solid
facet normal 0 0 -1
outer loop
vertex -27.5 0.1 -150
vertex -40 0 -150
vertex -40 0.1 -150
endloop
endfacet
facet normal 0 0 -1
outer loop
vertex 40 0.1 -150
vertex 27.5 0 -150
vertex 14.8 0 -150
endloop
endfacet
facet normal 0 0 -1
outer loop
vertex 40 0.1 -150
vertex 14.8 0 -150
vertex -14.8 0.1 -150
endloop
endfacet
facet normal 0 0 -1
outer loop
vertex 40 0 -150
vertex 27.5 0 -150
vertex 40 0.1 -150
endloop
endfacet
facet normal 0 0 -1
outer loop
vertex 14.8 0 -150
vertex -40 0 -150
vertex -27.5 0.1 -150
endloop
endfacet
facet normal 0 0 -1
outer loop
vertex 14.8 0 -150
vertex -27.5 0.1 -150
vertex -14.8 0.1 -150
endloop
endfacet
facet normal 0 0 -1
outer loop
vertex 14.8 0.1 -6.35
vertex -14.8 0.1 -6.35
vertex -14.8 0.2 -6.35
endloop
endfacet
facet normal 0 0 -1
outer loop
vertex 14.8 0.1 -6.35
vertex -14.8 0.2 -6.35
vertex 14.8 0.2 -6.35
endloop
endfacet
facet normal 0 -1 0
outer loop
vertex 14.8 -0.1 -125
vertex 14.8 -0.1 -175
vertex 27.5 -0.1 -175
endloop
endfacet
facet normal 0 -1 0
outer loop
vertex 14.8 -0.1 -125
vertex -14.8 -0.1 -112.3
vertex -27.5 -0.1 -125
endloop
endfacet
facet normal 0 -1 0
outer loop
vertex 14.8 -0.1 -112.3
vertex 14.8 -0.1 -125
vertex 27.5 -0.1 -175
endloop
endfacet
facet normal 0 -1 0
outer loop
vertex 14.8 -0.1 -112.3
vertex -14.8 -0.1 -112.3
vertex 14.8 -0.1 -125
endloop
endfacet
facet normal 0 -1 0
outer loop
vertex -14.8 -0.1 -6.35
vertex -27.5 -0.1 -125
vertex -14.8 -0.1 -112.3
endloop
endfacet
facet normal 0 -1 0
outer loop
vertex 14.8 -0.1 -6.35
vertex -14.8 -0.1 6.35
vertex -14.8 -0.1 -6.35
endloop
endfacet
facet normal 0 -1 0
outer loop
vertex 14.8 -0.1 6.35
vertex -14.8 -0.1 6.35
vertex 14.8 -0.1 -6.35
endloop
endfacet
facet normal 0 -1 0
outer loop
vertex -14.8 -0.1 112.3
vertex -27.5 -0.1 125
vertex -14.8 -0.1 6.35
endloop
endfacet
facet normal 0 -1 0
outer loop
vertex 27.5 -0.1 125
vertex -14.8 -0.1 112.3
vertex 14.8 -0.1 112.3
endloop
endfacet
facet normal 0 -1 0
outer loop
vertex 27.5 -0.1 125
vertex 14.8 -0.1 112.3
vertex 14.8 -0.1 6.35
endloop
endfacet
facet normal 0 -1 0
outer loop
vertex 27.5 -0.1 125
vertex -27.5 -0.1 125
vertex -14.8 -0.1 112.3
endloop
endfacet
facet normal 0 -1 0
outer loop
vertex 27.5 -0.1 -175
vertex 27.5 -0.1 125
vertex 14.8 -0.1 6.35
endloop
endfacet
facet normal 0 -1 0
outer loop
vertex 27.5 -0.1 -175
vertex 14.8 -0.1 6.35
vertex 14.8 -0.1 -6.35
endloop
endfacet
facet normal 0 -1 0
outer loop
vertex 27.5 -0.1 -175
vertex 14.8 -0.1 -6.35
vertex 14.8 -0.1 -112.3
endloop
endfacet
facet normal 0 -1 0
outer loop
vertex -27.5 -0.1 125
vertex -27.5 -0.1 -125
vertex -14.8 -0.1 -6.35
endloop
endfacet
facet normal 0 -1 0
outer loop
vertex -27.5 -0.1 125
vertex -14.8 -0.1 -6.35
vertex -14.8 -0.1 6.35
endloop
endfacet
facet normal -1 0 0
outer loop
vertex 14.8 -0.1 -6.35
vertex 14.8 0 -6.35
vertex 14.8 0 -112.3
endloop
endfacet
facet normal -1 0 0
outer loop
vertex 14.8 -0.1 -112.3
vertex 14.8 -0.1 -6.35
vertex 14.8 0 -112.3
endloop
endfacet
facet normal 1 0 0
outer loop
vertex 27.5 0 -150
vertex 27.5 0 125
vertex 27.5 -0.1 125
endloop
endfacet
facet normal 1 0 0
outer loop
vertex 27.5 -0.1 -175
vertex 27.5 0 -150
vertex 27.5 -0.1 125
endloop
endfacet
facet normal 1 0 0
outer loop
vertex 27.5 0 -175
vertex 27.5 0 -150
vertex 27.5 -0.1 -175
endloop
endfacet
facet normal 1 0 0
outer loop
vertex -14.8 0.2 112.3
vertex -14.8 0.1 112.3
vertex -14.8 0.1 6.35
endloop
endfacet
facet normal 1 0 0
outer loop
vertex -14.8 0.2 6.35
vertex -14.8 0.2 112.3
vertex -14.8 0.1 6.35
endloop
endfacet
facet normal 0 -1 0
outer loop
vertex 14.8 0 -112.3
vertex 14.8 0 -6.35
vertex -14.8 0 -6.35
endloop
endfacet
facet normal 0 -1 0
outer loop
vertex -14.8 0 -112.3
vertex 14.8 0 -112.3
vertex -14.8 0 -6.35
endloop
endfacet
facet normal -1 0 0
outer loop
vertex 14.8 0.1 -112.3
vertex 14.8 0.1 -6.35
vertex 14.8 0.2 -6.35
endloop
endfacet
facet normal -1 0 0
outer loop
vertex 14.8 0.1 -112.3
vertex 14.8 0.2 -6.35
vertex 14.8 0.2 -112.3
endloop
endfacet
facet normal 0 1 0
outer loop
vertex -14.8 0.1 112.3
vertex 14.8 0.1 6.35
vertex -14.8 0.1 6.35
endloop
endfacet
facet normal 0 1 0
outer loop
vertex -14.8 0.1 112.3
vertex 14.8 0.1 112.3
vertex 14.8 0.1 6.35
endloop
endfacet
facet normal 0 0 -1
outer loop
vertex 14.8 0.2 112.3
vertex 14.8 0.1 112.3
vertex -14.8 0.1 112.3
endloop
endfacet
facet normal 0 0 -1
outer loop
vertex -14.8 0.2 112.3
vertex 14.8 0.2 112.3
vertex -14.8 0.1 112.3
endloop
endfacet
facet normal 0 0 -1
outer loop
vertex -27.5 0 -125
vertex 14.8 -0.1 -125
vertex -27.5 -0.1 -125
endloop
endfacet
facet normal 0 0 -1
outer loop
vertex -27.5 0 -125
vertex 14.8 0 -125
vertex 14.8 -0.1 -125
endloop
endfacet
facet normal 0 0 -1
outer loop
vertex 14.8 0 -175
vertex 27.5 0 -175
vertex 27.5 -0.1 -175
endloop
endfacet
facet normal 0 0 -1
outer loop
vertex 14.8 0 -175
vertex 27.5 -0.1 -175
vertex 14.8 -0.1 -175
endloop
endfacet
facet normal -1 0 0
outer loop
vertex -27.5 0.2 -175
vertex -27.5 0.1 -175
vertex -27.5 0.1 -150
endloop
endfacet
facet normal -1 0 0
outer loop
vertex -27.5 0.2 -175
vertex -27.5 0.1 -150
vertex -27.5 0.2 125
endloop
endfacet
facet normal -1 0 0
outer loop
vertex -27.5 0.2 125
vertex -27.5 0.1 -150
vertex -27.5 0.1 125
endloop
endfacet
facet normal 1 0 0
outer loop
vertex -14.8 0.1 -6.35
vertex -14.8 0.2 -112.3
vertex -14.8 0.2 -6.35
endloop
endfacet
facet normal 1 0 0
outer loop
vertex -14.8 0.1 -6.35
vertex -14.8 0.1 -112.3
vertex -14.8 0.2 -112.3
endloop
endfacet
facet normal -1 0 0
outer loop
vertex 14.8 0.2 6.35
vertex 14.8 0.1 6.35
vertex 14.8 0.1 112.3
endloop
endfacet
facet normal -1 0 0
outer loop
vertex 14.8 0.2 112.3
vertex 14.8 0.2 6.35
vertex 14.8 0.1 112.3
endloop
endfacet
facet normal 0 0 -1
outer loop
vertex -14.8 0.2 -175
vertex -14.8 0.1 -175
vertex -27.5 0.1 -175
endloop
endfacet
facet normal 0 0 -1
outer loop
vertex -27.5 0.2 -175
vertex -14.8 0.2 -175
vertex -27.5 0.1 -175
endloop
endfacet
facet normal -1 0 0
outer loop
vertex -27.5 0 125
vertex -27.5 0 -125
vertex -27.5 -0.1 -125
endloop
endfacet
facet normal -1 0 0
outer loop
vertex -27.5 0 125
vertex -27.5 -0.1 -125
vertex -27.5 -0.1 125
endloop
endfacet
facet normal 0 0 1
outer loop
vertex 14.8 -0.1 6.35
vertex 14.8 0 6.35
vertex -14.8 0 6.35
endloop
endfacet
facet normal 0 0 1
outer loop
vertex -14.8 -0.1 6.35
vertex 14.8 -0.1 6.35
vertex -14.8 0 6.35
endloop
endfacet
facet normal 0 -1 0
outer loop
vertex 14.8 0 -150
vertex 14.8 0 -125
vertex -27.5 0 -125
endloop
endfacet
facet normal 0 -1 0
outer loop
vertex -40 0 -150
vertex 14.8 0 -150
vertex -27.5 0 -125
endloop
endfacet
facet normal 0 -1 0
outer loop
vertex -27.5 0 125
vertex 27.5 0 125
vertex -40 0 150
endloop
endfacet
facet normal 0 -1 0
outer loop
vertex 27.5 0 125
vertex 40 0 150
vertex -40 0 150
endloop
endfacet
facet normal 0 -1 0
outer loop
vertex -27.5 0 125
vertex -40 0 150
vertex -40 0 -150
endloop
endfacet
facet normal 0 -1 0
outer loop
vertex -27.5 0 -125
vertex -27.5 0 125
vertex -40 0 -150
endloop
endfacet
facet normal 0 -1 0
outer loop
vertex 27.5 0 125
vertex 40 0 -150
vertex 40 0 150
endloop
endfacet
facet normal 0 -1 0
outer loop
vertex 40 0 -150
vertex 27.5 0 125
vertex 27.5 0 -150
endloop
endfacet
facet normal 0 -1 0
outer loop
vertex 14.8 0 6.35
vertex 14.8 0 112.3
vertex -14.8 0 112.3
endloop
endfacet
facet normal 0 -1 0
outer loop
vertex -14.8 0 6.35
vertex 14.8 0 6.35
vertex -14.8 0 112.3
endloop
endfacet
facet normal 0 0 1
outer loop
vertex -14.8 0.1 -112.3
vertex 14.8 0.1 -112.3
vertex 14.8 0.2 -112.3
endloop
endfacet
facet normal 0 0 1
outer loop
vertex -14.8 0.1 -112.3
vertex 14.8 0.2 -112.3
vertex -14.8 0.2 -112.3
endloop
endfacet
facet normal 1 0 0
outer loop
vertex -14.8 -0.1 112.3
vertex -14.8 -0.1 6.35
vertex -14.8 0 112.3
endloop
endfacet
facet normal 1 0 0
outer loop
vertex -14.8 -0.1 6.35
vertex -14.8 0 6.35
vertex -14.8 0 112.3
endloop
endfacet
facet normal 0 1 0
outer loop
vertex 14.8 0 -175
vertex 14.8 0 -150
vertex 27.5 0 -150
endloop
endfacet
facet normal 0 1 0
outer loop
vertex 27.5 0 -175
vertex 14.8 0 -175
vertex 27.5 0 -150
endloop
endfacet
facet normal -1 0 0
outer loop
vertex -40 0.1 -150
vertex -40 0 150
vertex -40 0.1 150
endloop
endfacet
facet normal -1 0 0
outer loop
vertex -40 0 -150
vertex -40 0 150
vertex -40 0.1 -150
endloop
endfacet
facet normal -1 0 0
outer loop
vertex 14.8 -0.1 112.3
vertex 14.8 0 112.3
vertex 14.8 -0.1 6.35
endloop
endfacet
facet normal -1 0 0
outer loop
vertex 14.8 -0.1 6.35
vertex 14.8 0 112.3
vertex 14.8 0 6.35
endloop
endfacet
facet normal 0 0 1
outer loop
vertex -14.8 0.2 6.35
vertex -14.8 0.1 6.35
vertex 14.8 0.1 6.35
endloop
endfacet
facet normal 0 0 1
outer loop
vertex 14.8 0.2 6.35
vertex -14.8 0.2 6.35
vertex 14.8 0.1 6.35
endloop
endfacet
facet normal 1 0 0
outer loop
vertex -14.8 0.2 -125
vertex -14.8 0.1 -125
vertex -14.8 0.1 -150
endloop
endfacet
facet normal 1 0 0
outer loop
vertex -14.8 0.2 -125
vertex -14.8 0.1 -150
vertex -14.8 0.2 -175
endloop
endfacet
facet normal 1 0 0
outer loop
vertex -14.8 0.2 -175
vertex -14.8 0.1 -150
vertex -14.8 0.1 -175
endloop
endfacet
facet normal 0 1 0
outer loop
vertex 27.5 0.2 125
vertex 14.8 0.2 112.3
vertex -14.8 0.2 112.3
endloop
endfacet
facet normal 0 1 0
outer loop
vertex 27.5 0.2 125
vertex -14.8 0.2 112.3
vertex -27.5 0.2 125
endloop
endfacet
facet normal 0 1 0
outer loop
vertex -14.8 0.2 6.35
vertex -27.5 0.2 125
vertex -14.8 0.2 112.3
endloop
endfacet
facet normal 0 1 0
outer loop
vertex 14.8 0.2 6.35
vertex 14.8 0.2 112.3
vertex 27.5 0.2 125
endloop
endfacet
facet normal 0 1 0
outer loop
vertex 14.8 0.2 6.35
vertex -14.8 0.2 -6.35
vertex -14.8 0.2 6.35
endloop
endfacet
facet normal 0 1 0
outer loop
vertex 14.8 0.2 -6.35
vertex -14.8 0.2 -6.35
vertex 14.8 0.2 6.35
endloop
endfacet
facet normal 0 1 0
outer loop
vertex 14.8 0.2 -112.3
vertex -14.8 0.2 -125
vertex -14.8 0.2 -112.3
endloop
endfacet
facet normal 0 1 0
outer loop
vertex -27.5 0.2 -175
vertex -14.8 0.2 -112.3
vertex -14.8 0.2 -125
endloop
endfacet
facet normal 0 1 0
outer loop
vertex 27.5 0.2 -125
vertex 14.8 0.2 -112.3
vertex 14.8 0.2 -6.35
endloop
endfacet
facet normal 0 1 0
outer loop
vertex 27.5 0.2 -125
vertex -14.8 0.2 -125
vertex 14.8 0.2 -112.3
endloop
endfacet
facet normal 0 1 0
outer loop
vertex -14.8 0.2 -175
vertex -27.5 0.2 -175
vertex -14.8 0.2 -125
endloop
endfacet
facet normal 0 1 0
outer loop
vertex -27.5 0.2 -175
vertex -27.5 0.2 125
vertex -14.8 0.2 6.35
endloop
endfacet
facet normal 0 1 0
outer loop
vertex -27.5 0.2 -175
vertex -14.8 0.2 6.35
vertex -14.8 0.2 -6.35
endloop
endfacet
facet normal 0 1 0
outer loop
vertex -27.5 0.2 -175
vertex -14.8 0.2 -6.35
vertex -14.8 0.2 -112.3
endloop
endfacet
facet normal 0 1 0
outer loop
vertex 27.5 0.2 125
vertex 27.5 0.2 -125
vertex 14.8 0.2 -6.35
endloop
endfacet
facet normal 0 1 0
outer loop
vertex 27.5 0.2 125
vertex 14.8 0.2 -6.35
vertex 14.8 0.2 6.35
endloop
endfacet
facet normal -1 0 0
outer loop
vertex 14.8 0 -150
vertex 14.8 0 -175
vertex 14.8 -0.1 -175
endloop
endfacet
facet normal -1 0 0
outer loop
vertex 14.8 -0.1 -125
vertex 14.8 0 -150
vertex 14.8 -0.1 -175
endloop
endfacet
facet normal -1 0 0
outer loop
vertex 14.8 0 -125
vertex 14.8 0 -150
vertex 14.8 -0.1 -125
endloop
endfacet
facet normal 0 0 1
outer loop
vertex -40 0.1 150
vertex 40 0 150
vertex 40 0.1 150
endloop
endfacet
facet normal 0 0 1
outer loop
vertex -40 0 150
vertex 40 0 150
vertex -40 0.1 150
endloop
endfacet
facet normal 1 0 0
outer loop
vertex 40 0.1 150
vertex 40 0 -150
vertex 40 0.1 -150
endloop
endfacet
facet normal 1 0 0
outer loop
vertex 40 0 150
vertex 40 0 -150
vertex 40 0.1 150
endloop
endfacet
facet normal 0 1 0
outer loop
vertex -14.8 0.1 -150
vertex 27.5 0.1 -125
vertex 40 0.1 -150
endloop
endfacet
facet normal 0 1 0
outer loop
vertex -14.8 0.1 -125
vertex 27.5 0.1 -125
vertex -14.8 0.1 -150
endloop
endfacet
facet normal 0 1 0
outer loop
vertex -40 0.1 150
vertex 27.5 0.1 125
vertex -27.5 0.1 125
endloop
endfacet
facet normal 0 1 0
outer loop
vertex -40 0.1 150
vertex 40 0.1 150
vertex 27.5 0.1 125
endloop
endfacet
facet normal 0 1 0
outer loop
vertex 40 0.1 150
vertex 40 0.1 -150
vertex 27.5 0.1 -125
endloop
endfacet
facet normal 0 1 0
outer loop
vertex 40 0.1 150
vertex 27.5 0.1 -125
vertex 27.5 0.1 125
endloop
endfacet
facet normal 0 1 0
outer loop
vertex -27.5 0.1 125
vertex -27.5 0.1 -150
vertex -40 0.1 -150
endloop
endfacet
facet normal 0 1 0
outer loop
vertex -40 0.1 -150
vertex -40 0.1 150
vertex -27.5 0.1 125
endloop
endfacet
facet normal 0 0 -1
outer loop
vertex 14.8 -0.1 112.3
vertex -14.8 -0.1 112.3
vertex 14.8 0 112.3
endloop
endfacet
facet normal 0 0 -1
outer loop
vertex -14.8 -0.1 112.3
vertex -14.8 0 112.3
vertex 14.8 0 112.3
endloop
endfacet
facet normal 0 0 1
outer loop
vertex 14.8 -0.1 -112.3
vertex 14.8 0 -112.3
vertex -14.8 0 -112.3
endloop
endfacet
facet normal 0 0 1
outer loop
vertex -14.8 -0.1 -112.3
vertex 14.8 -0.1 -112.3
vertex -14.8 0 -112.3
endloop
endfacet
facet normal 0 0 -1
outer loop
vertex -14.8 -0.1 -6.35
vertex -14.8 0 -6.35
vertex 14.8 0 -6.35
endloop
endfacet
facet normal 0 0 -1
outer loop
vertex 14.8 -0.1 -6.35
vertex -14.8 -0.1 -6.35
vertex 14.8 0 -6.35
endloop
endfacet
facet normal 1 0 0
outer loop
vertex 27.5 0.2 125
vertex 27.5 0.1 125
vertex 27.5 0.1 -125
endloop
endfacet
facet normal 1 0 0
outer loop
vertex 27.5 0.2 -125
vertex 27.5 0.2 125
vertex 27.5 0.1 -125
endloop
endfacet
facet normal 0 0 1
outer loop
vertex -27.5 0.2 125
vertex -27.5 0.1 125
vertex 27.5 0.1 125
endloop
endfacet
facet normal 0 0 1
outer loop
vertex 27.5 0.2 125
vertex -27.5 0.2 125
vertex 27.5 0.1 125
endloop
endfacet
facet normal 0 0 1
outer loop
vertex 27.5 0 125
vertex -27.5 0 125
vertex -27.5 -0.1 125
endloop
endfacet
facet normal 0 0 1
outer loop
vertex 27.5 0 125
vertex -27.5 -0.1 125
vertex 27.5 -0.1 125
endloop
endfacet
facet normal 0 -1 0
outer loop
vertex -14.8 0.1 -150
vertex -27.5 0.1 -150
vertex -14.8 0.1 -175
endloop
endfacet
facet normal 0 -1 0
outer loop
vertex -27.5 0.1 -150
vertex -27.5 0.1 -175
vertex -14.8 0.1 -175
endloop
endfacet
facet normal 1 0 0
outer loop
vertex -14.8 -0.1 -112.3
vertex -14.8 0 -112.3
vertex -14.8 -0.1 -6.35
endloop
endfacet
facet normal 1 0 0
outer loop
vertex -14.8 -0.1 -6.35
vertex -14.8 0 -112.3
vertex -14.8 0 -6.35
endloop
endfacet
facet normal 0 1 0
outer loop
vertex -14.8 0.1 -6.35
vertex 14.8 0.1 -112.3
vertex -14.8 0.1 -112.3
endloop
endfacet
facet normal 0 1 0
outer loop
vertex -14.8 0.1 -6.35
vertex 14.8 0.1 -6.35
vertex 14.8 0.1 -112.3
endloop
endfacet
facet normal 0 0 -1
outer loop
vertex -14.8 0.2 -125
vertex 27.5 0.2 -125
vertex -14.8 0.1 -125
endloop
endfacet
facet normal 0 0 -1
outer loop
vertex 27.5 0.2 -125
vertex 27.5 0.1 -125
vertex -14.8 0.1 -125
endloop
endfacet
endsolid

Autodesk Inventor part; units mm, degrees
ref_plane "YZ Plane" through (0, 0, 0) normal (1, 0, 0) x (0, 1, 0)
ref_plane "XZ Plane" through (0, 0, 0) normal (0, 1, 0) x (-1, 0, 0)
ref_plane "XY Plane" through (0, 0, 0) normal (0, 0, 1) x (1, 0, 0)
sketch "Sketch1" plane through (0, 0, 0) normal (0, 1, 0) x (-1, 0, 0)
  line L0 (40, -150) -> (-40, -150)
  line L1 (-40, -150) -> (-40, 150)
  line L2 (-40, 150) -> (40, 150)
  line L3 (40, 150) -> (40, -150)
  line L4 (0, -150) -> (0, 150)
  line L5 (40, 0) -> (-40, 0)
  point P0 (0, 0)
  dimension "d0" = 300
  dimension "d1" = 80
extrude "Extrusion1" add sketch "Sketch1" along normal blind 0.1
sketch "Sketch2" plane through (0, 0.1, 0) normal (0, 1, 0) x (1, 0, 0)
  line L0 (-40, -150) -> (40, -150) projected
  line L1 (40, -150) -> (40, 150) projected
  line L2 (40, 150) -> (-40, 150) projected
  line L3 (-40, 150) -> (-40, -150) projected
  line L4 (-27.5, 175) -> (-27.5, -125)
  line L5 (-27.5, -125) -> (27.5, -125)
  line L6 (27.5, -125) -> (27.5, 125)
  line L7 (27.5, 125) -> (-14.8, 125)
  line L8 (-14.8, 125) -> (-14.8, 175)
  line L9 (-14.8, 175) -> (-27.5, 175)
  line L10 (-14.8, 112.3) -> (-14.8, 6.35)
  line L11 (-14.8, 6.35) -> (14.8, 6.35)
  line L12 (14.8, 6.35) -> (14.8, 112.3)
  line L13 (14.8, 112.3) -> (-14.8, 112.3)
  line L14 (-14.8, -6.35) -> (14.8, -6.35)
  line L15 (14.8, -6.35) -> (14.8, -112.3)
  line L16 (14.8, -112.3) -> (-14.8, -112.3)
  line L17 (-14.8, -112.3) -> (-14.8, -6.35)
  line L18 (-40, 0) -> (40, 0)
  point P0 (0, 0)
  dimension "d4" = 12.7
  dimension "d5" = 12.7
  dimension "d6" = 12.7
  dimension "d7" = 12.7
  dimension "d8" = 12.7
  dimension "d9" = 25
  dimension "d10" = 25
  dimension "d11" = 12.5
  dimension "d12" = 12.5
  dimension "d13" = 250
  dimension "d14" = 50
extrude "Extrusion2" add sketch "Sketch2" along normal blind 0.1 contours L18 L6 L5 L4 | L4 L2 L8 L7 L6 L18 | L4 L9 L8 L2
sketch "Sketch3" plane through (0, 0, 0) normal (0, -1, 0) x (1, 0, 0)
  line L0 (40, -150) -> (-40, -150) projected
  line L1 (27.5, 125) -> (27.5, -175)
  line L2 (27.5, -175) -> (14.8, -175)
  line L3 (14.8, -175) -> (14.8, -125)
  line L4 (14.8, -125) -> (-27.5, -125)
  line L5 (-27.5, -125) -> (-27.5, 125)
  line L6 (-27.5, 125) -> (27.5, 125)
  line L7 (-14.8, 112.3) -> (14.8, 112.3)
  line L8 (14.8, 112.3) -> (14.8, 6.35)
  line L9 (14.8, 6.35) -> (-14.8, 6.35)
  line L10 (-14.8, 6.35) -> (-14.8, 112.3)
  line L11 (-14.8, -6.35) -> (14.8, -6.35)
  line L12 (14.8, -6.35) -> (14.8, -112.3)
  line L13 (14.8, -112.3) -> (-14.8, -112.3)
  line L14 (-14.8, -112.3) -> (-14.8, -6.35)
  line L15 (27.5, 125) -> (-27.5, 125) projected
  line L16 (-14.8, 112.3) -> (14.8, 112.3) projected
  line L17 (-27.5, 125) -> (-27.5, -150) projected
  line L18 (27.5, -125) -> (27.5, 125) projected
  line L19 (-14.8, -125) -> (27.5, -125) projected
  line L20 (14.8, -6.35) -> (14.8, -112.3) projected
  line L21 (-14.8, -112.3) -> (-14.8, -6.35) projected
  line L22 (-14.8, -6.35) -> (14.8, -6.35) projected
  line L23 (14.8, 6.35) -> (-14.8, 6.35) projected
  line L24 (14.8, -112.3) -> (-14.8, -112.3) projected
  line L25 (-14.8, -175) -> (-27.5, -175) projected
  point P0 (0, 0)
extrude "Extrusion3" add sketch "Sketch3" along normal blind 0.1 contours L1 L2 L3 L0 | L0 L3 L19 L1 | L19 L4 L5 L6 L1
properties part number "Captor"
